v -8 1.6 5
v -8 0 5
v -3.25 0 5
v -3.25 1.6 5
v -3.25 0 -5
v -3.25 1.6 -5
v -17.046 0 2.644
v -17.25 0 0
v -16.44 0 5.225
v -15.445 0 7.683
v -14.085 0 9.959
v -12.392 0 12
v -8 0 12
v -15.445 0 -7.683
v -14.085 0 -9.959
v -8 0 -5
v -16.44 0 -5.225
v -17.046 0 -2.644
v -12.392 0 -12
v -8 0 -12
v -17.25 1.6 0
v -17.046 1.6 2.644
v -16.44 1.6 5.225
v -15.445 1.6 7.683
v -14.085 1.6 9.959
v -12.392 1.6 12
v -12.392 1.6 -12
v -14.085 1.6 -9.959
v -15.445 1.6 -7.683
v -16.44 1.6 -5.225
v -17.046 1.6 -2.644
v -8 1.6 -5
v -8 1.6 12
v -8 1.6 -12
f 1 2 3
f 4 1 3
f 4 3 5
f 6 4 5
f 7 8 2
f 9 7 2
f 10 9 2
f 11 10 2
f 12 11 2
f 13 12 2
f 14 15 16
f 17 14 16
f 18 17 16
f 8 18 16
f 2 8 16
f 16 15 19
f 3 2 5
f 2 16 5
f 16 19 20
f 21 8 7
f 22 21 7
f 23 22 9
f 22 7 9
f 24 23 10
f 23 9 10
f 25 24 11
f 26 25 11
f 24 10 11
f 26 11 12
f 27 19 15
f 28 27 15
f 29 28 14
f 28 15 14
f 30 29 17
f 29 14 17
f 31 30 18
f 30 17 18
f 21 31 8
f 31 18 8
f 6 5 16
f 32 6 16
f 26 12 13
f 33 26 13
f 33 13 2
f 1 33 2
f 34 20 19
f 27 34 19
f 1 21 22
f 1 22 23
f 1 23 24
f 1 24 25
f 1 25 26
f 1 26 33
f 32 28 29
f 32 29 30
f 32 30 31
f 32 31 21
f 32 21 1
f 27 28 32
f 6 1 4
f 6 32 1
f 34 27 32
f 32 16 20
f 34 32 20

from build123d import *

# Parameters (mm, degrees)
BOSS_EXTRUDE1_DEPTH = 1.6


with BuildPart() as part:
    # Sketch1 → Boss-Extrude1 (new body)
    with BuildSketch(Plane(origin=(0, 0, 0), x_dir=(1, 0, 0), z_dir=(0, 1, 0))):
        with BuildLine():
            Line((-3.25, 0), (-17.25, 0))
            ThreePointArc((-17.25, 0), (-15.989450927, -6.473017771), (-12.392033731, -12))
            Line((-12.392033731, -12), (-8, -12))
            Line((-8, -12), (-8, -5))
            Line((-8, -5), (-3.25, -5))
            Line((-3.25, -5), (-3.25, 0))
        make_face()
        with BuildLine():
            Line((-8, 12), (-12.392033731, 12))
            ThreePointArc((-12.392033731, 12), (-15.989450927, 6.473017771), (-17.25, 0))
            Line((-17.25, 0), (-3.25, 0))
            Line((-3.25, 0), (-3.25, 5))
            Line((-3.25, 5), (-8, 5))
            Line((-8, 5), (-8, 12))
        make_face()
    extrude(amount=BOSS_EXTRUDE1_DEPTH)


solid = part.part
